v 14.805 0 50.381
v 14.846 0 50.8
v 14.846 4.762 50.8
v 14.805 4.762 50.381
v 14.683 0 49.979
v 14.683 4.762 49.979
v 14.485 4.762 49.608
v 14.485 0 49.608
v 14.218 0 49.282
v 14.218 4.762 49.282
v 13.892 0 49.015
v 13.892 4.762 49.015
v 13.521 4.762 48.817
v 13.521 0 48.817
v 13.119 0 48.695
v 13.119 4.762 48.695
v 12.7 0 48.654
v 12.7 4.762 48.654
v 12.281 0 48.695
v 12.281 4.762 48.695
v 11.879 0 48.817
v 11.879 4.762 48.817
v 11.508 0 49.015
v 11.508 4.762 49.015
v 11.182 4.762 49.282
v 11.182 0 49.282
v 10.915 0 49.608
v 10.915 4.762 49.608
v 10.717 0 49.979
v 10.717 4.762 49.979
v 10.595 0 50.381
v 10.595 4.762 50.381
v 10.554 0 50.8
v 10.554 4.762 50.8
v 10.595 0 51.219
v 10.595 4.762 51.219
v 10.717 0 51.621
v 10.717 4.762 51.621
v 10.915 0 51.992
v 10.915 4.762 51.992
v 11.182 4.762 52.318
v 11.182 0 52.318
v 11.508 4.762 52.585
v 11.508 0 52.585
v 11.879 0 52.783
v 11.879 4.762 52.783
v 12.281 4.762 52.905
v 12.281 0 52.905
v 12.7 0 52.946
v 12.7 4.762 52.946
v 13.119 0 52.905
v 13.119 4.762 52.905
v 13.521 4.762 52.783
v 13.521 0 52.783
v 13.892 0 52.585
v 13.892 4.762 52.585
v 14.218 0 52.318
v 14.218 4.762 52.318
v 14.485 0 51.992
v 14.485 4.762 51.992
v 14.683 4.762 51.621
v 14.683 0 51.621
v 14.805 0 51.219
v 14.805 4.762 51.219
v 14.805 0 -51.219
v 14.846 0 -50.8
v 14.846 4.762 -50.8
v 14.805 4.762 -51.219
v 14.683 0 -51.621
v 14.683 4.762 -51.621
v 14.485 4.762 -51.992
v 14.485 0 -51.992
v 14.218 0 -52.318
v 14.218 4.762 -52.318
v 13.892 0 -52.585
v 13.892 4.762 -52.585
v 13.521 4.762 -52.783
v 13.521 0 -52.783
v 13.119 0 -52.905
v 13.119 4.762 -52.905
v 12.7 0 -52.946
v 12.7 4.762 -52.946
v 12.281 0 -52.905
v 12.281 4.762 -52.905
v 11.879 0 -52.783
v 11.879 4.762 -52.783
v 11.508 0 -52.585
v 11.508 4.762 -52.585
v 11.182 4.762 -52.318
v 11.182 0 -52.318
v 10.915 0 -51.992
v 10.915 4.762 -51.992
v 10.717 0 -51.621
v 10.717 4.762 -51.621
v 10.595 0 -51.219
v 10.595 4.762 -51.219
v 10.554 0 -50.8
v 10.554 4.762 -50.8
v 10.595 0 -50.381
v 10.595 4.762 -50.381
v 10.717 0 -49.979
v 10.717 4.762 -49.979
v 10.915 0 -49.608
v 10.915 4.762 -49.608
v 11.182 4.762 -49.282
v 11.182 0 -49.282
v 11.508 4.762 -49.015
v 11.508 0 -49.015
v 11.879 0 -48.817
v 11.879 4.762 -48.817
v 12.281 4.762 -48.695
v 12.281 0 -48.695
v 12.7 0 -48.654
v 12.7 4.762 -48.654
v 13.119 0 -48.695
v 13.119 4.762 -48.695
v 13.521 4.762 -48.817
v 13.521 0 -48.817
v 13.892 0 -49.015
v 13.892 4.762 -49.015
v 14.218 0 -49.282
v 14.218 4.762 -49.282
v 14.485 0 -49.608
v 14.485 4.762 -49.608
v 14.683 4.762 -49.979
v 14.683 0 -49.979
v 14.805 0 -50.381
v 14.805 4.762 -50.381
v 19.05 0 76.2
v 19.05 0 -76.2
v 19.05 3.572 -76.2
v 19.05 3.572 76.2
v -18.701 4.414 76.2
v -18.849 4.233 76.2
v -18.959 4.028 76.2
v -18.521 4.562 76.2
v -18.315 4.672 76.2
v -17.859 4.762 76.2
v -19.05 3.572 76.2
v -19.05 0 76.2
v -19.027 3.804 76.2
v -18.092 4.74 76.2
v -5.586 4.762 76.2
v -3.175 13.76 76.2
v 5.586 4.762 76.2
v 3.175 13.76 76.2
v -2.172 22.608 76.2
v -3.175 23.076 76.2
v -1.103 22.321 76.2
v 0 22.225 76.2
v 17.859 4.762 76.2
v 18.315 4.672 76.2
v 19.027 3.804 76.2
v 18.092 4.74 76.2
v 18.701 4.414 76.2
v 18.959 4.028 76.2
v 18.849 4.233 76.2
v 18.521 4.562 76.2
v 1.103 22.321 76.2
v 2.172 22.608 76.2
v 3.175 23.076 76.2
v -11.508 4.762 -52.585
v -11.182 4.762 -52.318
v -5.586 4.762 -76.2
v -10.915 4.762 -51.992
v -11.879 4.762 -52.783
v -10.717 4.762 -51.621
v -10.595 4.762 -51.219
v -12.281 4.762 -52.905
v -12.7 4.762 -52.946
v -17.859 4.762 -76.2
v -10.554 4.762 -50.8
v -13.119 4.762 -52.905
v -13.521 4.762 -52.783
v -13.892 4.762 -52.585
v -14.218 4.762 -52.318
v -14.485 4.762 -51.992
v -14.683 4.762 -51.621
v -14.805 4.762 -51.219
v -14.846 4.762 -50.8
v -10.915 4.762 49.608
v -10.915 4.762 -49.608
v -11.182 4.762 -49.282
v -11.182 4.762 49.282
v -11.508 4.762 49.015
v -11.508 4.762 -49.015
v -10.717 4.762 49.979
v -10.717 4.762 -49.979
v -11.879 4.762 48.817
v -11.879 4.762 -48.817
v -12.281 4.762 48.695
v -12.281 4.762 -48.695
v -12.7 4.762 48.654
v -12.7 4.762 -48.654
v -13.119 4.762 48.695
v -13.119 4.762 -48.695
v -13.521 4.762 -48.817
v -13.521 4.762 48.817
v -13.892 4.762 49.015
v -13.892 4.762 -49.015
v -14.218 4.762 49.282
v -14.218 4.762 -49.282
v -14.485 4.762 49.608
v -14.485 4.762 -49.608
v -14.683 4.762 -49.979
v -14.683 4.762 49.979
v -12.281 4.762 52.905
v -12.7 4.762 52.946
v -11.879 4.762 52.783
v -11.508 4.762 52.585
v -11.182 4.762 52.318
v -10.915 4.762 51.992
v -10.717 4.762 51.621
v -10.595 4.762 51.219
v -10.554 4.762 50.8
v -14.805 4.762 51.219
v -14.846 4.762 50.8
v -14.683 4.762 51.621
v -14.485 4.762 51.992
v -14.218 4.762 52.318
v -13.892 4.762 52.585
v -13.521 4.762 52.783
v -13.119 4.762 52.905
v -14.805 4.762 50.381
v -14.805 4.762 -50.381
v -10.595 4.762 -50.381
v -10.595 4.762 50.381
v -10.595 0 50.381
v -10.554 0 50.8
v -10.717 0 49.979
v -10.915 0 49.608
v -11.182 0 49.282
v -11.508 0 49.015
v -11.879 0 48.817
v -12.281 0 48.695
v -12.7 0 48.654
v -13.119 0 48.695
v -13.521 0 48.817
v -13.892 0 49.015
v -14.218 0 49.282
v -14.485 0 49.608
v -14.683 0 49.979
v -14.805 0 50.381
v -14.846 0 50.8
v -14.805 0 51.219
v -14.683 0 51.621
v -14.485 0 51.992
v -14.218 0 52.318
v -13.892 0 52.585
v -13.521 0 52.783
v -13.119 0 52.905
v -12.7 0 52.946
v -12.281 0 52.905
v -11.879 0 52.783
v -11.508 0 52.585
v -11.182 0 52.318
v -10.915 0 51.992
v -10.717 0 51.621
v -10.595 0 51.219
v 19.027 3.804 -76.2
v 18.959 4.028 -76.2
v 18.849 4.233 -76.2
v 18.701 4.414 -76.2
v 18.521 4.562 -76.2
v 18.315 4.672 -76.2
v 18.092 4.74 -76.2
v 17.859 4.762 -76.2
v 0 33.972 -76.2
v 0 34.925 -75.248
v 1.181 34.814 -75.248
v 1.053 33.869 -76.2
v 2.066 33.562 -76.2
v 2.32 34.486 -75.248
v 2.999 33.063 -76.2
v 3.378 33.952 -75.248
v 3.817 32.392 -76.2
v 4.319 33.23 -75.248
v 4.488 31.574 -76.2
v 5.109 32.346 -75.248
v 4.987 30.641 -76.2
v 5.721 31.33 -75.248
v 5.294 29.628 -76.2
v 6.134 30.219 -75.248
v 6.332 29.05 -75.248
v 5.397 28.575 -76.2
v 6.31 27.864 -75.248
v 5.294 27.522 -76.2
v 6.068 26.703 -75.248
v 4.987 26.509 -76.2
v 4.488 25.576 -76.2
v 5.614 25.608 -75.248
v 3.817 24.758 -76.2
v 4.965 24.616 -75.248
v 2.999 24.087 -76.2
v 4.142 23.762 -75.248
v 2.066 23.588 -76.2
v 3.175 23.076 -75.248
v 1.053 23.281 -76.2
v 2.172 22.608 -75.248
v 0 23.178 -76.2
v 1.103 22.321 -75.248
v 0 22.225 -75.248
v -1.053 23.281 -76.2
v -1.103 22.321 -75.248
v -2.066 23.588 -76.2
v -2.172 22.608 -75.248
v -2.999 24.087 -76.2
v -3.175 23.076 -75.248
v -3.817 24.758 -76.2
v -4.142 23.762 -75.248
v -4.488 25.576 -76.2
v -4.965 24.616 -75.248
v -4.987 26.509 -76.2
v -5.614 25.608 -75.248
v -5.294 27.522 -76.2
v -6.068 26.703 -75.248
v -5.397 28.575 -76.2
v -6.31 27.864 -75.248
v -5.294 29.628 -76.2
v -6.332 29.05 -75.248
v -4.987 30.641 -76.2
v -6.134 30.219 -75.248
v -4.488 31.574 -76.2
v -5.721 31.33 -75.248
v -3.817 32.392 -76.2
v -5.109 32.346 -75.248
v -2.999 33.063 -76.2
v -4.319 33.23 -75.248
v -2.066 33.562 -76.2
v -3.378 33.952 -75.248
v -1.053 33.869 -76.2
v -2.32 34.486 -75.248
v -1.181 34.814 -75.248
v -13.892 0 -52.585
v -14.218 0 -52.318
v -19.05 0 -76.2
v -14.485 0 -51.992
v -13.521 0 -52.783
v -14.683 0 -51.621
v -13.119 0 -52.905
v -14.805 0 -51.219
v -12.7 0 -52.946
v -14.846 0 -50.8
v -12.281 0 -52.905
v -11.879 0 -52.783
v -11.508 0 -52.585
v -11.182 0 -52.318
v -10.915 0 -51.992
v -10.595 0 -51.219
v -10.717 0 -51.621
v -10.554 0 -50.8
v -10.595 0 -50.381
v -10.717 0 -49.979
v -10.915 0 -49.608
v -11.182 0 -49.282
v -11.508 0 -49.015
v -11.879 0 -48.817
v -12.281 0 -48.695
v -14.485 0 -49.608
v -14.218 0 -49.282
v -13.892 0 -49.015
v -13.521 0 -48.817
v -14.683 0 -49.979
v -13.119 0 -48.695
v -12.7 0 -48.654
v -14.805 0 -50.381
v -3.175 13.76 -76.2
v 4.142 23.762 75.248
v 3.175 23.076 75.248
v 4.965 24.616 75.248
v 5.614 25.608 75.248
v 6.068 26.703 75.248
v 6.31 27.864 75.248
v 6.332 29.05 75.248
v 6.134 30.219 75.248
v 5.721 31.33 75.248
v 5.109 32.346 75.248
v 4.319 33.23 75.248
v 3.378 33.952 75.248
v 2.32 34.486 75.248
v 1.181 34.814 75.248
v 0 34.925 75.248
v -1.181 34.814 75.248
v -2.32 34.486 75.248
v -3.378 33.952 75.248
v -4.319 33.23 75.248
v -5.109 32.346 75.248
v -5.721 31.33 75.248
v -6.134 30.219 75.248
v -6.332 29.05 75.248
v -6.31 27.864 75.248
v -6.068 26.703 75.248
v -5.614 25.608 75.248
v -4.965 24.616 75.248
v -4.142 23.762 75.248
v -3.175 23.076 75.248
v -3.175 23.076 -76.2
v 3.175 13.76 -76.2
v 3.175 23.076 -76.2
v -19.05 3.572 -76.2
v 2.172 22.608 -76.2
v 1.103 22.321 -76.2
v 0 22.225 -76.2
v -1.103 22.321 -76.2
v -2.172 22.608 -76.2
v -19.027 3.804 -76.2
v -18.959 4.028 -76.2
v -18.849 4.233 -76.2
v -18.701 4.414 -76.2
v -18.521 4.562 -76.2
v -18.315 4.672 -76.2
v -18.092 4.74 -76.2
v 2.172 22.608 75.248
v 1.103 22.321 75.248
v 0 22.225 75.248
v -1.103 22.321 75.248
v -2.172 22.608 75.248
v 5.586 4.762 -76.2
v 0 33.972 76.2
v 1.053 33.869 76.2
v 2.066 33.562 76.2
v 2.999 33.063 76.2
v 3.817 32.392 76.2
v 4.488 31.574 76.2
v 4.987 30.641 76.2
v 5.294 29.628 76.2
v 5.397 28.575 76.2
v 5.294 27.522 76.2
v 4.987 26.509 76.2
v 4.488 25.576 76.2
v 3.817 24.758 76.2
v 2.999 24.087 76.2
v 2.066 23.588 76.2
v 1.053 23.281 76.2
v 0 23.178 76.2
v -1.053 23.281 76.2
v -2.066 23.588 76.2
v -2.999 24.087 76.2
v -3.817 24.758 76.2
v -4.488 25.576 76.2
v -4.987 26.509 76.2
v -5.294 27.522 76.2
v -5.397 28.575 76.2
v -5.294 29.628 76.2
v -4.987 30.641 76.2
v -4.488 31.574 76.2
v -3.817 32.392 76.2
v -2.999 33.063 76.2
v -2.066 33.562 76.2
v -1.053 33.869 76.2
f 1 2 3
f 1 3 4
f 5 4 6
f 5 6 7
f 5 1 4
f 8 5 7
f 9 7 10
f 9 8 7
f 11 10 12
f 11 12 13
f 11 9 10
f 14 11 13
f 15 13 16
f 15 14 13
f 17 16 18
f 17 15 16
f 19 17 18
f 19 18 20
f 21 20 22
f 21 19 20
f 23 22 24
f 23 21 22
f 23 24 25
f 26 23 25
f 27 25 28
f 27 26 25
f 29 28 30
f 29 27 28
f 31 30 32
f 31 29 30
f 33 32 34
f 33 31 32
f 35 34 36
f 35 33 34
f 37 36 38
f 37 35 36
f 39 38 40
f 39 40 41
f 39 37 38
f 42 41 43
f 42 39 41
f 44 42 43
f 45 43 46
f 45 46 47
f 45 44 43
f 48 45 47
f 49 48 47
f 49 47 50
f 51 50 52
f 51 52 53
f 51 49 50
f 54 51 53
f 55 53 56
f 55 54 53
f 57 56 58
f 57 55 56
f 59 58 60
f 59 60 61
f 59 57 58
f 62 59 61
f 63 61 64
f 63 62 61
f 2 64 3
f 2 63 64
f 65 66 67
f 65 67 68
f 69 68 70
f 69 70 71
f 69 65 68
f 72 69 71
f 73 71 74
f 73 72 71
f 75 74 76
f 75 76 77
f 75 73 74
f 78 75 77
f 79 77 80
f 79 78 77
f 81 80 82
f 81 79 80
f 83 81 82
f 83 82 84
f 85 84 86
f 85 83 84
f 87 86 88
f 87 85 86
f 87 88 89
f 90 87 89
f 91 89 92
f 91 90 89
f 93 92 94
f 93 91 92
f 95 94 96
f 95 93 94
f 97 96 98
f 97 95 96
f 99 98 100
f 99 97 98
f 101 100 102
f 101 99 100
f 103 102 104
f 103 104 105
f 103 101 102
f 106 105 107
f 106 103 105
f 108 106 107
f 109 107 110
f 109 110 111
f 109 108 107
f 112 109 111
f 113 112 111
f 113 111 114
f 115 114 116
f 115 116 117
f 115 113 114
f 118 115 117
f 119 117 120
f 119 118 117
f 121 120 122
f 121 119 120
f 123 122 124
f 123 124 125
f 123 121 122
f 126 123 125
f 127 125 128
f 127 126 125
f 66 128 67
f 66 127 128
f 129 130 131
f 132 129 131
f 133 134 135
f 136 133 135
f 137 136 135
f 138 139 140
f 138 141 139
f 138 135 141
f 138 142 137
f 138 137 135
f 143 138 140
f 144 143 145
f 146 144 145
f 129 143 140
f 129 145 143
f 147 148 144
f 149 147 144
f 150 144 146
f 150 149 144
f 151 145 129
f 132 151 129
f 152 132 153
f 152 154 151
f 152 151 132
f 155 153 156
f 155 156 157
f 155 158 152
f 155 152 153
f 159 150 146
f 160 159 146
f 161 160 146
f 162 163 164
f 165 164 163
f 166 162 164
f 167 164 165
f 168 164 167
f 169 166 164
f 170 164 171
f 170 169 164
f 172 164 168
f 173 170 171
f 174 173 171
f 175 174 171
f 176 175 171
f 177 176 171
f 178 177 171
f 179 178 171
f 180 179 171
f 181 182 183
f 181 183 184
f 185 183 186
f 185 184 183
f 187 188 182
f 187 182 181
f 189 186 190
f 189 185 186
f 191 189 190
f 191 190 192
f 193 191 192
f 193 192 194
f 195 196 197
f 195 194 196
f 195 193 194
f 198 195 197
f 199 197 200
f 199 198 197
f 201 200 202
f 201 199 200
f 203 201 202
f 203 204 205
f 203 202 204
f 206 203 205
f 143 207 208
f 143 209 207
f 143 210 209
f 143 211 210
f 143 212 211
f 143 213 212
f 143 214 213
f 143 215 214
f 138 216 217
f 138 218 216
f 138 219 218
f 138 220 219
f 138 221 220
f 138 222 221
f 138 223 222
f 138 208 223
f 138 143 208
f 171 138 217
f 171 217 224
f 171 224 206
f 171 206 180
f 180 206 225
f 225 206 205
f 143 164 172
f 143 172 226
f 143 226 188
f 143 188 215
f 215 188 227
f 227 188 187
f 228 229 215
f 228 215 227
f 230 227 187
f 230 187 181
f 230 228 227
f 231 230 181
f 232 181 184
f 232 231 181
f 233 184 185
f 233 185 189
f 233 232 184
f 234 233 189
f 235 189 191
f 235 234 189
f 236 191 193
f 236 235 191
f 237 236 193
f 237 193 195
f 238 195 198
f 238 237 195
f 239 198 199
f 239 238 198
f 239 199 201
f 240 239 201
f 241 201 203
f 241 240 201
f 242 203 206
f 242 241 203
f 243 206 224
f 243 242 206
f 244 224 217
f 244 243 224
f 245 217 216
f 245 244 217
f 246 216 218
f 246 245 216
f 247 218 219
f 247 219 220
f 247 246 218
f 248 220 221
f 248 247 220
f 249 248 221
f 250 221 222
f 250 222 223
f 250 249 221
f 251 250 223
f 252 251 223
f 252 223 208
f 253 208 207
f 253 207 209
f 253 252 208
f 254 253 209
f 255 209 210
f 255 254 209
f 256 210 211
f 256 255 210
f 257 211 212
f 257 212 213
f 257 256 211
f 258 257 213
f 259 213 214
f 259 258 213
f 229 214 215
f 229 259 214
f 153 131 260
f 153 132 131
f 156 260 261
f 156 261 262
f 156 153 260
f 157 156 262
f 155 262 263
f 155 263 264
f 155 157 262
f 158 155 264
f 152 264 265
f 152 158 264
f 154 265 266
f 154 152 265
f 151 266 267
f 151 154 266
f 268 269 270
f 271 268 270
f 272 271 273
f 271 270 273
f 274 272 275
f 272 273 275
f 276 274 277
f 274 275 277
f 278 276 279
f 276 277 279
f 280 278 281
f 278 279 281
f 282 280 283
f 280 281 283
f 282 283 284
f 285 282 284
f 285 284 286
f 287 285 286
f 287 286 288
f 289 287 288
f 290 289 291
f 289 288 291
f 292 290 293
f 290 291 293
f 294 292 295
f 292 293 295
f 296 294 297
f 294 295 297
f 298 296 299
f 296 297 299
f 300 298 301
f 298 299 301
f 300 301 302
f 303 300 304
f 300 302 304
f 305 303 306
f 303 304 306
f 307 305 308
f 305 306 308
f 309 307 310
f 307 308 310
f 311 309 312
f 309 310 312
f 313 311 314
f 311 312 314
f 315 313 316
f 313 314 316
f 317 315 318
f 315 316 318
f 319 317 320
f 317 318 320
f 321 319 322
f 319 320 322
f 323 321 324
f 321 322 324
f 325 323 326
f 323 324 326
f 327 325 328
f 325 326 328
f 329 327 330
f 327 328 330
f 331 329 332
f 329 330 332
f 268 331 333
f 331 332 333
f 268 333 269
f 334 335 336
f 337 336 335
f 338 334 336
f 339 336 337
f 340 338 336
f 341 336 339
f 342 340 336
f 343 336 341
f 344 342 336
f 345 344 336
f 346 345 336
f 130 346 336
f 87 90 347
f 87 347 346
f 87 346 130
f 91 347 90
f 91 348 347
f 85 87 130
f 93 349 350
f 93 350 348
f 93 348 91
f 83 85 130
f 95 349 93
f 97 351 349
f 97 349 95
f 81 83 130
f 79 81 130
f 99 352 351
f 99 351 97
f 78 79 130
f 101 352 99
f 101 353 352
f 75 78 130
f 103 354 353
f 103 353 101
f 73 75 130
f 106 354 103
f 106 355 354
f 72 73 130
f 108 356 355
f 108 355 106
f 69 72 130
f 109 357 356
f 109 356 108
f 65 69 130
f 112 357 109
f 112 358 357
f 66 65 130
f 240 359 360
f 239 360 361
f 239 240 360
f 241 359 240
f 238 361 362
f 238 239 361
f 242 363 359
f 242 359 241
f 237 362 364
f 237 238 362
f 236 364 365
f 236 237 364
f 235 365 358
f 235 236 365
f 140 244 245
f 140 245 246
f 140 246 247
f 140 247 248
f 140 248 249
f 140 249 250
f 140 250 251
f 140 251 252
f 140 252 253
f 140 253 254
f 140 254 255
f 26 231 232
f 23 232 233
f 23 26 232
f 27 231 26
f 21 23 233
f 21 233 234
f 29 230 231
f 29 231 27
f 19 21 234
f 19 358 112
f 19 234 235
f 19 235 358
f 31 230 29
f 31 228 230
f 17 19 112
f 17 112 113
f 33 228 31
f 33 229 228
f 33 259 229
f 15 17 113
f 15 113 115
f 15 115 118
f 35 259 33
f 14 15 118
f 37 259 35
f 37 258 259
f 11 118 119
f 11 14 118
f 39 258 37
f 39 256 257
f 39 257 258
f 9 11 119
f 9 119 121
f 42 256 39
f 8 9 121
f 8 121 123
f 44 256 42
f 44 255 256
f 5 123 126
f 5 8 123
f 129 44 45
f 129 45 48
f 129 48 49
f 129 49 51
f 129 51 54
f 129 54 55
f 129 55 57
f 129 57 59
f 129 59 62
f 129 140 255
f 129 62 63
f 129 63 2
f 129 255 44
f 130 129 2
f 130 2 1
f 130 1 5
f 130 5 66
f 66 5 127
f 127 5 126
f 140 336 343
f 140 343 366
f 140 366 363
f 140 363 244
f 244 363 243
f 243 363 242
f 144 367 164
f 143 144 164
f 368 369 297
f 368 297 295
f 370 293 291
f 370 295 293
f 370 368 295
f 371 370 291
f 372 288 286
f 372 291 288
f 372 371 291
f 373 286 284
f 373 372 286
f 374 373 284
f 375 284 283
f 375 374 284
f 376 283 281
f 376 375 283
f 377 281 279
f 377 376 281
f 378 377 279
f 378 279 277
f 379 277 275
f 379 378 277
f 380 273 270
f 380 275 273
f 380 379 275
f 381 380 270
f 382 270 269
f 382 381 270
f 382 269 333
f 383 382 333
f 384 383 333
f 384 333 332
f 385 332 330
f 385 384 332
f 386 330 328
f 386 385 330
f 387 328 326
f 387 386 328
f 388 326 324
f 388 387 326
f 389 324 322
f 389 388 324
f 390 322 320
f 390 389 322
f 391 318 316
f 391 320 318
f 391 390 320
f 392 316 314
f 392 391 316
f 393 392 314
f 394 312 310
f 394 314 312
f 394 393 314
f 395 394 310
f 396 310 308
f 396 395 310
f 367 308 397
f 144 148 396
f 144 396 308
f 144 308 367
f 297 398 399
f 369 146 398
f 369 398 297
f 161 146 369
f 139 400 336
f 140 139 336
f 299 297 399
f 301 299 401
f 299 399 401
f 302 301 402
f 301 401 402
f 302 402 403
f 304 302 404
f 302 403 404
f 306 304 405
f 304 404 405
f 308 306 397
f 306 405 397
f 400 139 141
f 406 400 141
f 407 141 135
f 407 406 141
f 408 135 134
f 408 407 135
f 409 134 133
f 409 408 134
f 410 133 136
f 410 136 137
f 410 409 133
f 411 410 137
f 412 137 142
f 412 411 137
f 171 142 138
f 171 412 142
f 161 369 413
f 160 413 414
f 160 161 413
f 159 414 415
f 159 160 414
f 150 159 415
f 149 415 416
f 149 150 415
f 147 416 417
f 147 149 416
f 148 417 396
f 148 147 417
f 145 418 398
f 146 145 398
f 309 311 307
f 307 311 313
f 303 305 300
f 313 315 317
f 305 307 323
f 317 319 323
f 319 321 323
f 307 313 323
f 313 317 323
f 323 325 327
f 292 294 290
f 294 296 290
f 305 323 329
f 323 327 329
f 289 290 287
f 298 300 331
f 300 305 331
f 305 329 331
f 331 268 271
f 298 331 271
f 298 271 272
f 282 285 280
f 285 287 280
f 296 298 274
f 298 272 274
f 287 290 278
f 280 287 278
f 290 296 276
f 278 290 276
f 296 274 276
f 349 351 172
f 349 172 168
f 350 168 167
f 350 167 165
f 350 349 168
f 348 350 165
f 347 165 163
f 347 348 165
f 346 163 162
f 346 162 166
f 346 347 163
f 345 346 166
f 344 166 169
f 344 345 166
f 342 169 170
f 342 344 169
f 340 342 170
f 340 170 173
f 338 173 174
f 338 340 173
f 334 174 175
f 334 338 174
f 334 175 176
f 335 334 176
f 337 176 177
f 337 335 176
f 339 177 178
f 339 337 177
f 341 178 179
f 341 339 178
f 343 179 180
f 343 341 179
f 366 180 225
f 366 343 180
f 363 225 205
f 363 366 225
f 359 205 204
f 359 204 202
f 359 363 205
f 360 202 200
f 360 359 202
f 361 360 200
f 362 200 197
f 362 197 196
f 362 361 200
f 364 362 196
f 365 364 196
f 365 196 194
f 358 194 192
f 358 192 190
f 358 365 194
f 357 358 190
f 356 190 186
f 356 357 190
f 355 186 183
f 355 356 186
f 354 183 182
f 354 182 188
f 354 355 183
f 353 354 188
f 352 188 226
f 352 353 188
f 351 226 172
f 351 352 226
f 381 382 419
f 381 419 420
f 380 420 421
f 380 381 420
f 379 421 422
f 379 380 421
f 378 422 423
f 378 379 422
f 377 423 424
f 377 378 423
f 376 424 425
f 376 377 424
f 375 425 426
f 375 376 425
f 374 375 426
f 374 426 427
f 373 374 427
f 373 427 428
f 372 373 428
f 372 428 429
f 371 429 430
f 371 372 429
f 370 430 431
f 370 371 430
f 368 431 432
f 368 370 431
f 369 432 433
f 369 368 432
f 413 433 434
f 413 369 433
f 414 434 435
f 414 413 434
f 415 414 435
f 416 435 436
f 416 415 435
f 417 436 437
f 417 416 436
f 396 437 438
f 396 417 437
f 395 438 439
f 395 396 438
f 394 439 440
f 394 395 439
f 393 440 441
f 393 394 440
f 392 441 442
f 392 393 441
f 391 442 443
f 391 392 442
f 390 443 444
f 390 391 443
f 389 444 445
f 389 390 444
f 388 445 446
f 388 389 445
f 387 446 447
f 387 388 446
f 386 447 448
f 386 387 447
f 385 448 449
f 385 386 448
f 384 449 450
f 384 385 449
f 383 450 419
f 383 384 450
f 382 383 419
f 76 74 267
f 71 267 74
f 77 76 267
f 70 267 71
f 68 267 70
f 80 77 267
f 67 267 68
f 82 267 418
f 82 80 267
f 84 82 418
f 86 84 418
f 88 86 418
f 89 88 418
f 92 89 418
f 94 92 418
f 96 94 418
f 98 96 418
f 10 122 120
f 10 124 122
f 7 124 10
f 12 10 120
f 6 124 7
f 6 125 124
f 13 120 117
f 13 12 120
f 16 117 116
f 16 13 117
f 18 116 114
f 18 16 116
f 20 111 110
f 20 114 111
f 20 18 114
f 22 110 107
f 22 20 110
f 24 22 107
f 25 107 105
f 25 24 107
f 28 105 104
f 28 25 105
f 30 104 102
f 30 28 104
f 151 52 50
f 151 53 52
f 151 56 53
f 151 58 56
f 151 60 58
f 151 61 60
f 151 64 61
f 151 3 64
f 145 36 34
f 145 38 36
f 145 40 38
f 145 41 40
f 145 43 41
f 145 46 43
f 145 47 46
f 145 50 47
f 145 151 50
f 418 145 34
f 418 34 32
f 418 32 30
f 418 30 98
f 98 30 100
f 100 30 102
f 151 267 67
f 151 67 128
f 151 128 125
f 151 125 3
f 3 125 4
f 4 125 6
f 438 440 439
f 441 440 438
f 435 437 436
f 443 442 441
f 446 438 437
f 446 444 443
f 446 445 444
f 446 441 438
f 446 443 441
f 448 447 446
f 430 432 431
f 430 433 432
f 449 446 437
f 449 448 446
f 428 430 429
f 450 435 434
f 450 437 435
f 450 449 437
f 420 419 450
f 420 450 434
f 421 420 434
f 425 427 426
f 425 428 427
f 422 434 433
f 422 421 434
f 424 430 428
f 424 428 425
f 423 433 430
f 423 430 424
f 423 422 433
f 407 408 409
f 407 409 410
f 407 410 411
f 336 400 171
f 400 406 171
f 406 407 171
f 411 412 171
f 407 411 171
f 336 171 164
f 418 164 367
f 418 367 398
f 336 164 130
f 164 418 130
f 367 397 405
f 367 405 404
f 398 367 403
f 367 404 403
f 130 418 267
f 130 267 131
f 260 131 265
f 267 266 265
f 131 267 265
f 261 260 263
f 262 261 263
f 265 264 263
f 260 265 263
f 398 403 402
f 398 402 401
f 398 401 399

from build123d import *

# Parameters (mm, degrees)
EXTRUDE1_DEPTH  = 76.2
FILLET1_R       = 1.190625
SKETCH4_R       = 2.1463
EXTRUDE3_DEPTH  = 4.7625
LPATTERN1_COUNT = 19
LPATTERN1_PITCH = 101.6


with BuildPart() as part:
    # Sketch1 → Extrude1 (new body, symmetric)
    with BuildSketch(Plane.XY):
        with BuildLine():
            Line((-19.05, 0), (19.05, 0))
            Line((19.05, 0), (19.05, 4.7625))
            Line((19.05, 4.7625), (5.585983612, 4.7625))
            Line((5.585983612, 4.7625), (3.175, 13.760413336))
            Line((3.175, 13.760413336), (3.175, 23.075738686))
            ThreePointArc((3.175, 23.075738686), (0, 34.925), (-3.175, 23.075738686))
            Line((-3.175, 23.075738686), (-3.175, 13.760413336))
            Line((-3.175, 13.760413336), (-5.585983612, 4.7625))
            Line((-5.585983612, 4.7625), (-19.05, 4.7625))
            Line((-19.05, 4.7625), (-19.05, 0))
        make_face()
    extrude(amount=EXTRUDE1_DEPTH, both=True)

    # Sketch3 → Cut-Revolve1 (revolve, cut)
    with BuildSketch(Plane(origin=(0, 0, 0), x_dir=(0, 0, -1), z_dir=(1, 0, 0))):
        Polygon((-76.2, 33.9725), (-75.2475, 34.925), (-76.2, 34.925), align=None)
    cut_revolve1 = revolve(axis=Axis((0, 28.575, 76.2), (0, 0, -1)), mode=Mode.SUBTRACT)

    # Mirror1: Cut-Revolve1 across plane
    add(cut_revolve1.mirror(Plane.XY), mode=Mode.SUBTRACT)

    # Fillet1
    fillet1_edges = [part.edges().sort_by_distance(p)[0] for p in [
        (-19.05, 4.7625, 0),
        (19.05, 4.7625, 0),
    ]]
    fillet(fillet1_edges, radius=FILLET1_R)

    # Sketch4 → Extrude3 (cut)
    with BuildSketch(Plane(origin=(0, 0, 0), x_dir=(1, 0, 0), z_dir=(0, 1, 0))):
        with Locations((12.7, -50.8)):
            Circle(SKETCH4_R)
        with Locations((-12.7, -50.8)):
            Circle(SKETCH4_R)
    extrude3 = extrude(amount=EXTRUDE3_DEPTH, mode=Mode.SUBTRACT)

    # LPattern1: Extrude3 ×19
    with Locations(*[(0, 0, -i * LPATTERN1_PITCH) for i in range(1, LPATTERN1_COUNT)]):
        add(extrude3, mode=Mode.SUBTRACT)


solid = part.part
